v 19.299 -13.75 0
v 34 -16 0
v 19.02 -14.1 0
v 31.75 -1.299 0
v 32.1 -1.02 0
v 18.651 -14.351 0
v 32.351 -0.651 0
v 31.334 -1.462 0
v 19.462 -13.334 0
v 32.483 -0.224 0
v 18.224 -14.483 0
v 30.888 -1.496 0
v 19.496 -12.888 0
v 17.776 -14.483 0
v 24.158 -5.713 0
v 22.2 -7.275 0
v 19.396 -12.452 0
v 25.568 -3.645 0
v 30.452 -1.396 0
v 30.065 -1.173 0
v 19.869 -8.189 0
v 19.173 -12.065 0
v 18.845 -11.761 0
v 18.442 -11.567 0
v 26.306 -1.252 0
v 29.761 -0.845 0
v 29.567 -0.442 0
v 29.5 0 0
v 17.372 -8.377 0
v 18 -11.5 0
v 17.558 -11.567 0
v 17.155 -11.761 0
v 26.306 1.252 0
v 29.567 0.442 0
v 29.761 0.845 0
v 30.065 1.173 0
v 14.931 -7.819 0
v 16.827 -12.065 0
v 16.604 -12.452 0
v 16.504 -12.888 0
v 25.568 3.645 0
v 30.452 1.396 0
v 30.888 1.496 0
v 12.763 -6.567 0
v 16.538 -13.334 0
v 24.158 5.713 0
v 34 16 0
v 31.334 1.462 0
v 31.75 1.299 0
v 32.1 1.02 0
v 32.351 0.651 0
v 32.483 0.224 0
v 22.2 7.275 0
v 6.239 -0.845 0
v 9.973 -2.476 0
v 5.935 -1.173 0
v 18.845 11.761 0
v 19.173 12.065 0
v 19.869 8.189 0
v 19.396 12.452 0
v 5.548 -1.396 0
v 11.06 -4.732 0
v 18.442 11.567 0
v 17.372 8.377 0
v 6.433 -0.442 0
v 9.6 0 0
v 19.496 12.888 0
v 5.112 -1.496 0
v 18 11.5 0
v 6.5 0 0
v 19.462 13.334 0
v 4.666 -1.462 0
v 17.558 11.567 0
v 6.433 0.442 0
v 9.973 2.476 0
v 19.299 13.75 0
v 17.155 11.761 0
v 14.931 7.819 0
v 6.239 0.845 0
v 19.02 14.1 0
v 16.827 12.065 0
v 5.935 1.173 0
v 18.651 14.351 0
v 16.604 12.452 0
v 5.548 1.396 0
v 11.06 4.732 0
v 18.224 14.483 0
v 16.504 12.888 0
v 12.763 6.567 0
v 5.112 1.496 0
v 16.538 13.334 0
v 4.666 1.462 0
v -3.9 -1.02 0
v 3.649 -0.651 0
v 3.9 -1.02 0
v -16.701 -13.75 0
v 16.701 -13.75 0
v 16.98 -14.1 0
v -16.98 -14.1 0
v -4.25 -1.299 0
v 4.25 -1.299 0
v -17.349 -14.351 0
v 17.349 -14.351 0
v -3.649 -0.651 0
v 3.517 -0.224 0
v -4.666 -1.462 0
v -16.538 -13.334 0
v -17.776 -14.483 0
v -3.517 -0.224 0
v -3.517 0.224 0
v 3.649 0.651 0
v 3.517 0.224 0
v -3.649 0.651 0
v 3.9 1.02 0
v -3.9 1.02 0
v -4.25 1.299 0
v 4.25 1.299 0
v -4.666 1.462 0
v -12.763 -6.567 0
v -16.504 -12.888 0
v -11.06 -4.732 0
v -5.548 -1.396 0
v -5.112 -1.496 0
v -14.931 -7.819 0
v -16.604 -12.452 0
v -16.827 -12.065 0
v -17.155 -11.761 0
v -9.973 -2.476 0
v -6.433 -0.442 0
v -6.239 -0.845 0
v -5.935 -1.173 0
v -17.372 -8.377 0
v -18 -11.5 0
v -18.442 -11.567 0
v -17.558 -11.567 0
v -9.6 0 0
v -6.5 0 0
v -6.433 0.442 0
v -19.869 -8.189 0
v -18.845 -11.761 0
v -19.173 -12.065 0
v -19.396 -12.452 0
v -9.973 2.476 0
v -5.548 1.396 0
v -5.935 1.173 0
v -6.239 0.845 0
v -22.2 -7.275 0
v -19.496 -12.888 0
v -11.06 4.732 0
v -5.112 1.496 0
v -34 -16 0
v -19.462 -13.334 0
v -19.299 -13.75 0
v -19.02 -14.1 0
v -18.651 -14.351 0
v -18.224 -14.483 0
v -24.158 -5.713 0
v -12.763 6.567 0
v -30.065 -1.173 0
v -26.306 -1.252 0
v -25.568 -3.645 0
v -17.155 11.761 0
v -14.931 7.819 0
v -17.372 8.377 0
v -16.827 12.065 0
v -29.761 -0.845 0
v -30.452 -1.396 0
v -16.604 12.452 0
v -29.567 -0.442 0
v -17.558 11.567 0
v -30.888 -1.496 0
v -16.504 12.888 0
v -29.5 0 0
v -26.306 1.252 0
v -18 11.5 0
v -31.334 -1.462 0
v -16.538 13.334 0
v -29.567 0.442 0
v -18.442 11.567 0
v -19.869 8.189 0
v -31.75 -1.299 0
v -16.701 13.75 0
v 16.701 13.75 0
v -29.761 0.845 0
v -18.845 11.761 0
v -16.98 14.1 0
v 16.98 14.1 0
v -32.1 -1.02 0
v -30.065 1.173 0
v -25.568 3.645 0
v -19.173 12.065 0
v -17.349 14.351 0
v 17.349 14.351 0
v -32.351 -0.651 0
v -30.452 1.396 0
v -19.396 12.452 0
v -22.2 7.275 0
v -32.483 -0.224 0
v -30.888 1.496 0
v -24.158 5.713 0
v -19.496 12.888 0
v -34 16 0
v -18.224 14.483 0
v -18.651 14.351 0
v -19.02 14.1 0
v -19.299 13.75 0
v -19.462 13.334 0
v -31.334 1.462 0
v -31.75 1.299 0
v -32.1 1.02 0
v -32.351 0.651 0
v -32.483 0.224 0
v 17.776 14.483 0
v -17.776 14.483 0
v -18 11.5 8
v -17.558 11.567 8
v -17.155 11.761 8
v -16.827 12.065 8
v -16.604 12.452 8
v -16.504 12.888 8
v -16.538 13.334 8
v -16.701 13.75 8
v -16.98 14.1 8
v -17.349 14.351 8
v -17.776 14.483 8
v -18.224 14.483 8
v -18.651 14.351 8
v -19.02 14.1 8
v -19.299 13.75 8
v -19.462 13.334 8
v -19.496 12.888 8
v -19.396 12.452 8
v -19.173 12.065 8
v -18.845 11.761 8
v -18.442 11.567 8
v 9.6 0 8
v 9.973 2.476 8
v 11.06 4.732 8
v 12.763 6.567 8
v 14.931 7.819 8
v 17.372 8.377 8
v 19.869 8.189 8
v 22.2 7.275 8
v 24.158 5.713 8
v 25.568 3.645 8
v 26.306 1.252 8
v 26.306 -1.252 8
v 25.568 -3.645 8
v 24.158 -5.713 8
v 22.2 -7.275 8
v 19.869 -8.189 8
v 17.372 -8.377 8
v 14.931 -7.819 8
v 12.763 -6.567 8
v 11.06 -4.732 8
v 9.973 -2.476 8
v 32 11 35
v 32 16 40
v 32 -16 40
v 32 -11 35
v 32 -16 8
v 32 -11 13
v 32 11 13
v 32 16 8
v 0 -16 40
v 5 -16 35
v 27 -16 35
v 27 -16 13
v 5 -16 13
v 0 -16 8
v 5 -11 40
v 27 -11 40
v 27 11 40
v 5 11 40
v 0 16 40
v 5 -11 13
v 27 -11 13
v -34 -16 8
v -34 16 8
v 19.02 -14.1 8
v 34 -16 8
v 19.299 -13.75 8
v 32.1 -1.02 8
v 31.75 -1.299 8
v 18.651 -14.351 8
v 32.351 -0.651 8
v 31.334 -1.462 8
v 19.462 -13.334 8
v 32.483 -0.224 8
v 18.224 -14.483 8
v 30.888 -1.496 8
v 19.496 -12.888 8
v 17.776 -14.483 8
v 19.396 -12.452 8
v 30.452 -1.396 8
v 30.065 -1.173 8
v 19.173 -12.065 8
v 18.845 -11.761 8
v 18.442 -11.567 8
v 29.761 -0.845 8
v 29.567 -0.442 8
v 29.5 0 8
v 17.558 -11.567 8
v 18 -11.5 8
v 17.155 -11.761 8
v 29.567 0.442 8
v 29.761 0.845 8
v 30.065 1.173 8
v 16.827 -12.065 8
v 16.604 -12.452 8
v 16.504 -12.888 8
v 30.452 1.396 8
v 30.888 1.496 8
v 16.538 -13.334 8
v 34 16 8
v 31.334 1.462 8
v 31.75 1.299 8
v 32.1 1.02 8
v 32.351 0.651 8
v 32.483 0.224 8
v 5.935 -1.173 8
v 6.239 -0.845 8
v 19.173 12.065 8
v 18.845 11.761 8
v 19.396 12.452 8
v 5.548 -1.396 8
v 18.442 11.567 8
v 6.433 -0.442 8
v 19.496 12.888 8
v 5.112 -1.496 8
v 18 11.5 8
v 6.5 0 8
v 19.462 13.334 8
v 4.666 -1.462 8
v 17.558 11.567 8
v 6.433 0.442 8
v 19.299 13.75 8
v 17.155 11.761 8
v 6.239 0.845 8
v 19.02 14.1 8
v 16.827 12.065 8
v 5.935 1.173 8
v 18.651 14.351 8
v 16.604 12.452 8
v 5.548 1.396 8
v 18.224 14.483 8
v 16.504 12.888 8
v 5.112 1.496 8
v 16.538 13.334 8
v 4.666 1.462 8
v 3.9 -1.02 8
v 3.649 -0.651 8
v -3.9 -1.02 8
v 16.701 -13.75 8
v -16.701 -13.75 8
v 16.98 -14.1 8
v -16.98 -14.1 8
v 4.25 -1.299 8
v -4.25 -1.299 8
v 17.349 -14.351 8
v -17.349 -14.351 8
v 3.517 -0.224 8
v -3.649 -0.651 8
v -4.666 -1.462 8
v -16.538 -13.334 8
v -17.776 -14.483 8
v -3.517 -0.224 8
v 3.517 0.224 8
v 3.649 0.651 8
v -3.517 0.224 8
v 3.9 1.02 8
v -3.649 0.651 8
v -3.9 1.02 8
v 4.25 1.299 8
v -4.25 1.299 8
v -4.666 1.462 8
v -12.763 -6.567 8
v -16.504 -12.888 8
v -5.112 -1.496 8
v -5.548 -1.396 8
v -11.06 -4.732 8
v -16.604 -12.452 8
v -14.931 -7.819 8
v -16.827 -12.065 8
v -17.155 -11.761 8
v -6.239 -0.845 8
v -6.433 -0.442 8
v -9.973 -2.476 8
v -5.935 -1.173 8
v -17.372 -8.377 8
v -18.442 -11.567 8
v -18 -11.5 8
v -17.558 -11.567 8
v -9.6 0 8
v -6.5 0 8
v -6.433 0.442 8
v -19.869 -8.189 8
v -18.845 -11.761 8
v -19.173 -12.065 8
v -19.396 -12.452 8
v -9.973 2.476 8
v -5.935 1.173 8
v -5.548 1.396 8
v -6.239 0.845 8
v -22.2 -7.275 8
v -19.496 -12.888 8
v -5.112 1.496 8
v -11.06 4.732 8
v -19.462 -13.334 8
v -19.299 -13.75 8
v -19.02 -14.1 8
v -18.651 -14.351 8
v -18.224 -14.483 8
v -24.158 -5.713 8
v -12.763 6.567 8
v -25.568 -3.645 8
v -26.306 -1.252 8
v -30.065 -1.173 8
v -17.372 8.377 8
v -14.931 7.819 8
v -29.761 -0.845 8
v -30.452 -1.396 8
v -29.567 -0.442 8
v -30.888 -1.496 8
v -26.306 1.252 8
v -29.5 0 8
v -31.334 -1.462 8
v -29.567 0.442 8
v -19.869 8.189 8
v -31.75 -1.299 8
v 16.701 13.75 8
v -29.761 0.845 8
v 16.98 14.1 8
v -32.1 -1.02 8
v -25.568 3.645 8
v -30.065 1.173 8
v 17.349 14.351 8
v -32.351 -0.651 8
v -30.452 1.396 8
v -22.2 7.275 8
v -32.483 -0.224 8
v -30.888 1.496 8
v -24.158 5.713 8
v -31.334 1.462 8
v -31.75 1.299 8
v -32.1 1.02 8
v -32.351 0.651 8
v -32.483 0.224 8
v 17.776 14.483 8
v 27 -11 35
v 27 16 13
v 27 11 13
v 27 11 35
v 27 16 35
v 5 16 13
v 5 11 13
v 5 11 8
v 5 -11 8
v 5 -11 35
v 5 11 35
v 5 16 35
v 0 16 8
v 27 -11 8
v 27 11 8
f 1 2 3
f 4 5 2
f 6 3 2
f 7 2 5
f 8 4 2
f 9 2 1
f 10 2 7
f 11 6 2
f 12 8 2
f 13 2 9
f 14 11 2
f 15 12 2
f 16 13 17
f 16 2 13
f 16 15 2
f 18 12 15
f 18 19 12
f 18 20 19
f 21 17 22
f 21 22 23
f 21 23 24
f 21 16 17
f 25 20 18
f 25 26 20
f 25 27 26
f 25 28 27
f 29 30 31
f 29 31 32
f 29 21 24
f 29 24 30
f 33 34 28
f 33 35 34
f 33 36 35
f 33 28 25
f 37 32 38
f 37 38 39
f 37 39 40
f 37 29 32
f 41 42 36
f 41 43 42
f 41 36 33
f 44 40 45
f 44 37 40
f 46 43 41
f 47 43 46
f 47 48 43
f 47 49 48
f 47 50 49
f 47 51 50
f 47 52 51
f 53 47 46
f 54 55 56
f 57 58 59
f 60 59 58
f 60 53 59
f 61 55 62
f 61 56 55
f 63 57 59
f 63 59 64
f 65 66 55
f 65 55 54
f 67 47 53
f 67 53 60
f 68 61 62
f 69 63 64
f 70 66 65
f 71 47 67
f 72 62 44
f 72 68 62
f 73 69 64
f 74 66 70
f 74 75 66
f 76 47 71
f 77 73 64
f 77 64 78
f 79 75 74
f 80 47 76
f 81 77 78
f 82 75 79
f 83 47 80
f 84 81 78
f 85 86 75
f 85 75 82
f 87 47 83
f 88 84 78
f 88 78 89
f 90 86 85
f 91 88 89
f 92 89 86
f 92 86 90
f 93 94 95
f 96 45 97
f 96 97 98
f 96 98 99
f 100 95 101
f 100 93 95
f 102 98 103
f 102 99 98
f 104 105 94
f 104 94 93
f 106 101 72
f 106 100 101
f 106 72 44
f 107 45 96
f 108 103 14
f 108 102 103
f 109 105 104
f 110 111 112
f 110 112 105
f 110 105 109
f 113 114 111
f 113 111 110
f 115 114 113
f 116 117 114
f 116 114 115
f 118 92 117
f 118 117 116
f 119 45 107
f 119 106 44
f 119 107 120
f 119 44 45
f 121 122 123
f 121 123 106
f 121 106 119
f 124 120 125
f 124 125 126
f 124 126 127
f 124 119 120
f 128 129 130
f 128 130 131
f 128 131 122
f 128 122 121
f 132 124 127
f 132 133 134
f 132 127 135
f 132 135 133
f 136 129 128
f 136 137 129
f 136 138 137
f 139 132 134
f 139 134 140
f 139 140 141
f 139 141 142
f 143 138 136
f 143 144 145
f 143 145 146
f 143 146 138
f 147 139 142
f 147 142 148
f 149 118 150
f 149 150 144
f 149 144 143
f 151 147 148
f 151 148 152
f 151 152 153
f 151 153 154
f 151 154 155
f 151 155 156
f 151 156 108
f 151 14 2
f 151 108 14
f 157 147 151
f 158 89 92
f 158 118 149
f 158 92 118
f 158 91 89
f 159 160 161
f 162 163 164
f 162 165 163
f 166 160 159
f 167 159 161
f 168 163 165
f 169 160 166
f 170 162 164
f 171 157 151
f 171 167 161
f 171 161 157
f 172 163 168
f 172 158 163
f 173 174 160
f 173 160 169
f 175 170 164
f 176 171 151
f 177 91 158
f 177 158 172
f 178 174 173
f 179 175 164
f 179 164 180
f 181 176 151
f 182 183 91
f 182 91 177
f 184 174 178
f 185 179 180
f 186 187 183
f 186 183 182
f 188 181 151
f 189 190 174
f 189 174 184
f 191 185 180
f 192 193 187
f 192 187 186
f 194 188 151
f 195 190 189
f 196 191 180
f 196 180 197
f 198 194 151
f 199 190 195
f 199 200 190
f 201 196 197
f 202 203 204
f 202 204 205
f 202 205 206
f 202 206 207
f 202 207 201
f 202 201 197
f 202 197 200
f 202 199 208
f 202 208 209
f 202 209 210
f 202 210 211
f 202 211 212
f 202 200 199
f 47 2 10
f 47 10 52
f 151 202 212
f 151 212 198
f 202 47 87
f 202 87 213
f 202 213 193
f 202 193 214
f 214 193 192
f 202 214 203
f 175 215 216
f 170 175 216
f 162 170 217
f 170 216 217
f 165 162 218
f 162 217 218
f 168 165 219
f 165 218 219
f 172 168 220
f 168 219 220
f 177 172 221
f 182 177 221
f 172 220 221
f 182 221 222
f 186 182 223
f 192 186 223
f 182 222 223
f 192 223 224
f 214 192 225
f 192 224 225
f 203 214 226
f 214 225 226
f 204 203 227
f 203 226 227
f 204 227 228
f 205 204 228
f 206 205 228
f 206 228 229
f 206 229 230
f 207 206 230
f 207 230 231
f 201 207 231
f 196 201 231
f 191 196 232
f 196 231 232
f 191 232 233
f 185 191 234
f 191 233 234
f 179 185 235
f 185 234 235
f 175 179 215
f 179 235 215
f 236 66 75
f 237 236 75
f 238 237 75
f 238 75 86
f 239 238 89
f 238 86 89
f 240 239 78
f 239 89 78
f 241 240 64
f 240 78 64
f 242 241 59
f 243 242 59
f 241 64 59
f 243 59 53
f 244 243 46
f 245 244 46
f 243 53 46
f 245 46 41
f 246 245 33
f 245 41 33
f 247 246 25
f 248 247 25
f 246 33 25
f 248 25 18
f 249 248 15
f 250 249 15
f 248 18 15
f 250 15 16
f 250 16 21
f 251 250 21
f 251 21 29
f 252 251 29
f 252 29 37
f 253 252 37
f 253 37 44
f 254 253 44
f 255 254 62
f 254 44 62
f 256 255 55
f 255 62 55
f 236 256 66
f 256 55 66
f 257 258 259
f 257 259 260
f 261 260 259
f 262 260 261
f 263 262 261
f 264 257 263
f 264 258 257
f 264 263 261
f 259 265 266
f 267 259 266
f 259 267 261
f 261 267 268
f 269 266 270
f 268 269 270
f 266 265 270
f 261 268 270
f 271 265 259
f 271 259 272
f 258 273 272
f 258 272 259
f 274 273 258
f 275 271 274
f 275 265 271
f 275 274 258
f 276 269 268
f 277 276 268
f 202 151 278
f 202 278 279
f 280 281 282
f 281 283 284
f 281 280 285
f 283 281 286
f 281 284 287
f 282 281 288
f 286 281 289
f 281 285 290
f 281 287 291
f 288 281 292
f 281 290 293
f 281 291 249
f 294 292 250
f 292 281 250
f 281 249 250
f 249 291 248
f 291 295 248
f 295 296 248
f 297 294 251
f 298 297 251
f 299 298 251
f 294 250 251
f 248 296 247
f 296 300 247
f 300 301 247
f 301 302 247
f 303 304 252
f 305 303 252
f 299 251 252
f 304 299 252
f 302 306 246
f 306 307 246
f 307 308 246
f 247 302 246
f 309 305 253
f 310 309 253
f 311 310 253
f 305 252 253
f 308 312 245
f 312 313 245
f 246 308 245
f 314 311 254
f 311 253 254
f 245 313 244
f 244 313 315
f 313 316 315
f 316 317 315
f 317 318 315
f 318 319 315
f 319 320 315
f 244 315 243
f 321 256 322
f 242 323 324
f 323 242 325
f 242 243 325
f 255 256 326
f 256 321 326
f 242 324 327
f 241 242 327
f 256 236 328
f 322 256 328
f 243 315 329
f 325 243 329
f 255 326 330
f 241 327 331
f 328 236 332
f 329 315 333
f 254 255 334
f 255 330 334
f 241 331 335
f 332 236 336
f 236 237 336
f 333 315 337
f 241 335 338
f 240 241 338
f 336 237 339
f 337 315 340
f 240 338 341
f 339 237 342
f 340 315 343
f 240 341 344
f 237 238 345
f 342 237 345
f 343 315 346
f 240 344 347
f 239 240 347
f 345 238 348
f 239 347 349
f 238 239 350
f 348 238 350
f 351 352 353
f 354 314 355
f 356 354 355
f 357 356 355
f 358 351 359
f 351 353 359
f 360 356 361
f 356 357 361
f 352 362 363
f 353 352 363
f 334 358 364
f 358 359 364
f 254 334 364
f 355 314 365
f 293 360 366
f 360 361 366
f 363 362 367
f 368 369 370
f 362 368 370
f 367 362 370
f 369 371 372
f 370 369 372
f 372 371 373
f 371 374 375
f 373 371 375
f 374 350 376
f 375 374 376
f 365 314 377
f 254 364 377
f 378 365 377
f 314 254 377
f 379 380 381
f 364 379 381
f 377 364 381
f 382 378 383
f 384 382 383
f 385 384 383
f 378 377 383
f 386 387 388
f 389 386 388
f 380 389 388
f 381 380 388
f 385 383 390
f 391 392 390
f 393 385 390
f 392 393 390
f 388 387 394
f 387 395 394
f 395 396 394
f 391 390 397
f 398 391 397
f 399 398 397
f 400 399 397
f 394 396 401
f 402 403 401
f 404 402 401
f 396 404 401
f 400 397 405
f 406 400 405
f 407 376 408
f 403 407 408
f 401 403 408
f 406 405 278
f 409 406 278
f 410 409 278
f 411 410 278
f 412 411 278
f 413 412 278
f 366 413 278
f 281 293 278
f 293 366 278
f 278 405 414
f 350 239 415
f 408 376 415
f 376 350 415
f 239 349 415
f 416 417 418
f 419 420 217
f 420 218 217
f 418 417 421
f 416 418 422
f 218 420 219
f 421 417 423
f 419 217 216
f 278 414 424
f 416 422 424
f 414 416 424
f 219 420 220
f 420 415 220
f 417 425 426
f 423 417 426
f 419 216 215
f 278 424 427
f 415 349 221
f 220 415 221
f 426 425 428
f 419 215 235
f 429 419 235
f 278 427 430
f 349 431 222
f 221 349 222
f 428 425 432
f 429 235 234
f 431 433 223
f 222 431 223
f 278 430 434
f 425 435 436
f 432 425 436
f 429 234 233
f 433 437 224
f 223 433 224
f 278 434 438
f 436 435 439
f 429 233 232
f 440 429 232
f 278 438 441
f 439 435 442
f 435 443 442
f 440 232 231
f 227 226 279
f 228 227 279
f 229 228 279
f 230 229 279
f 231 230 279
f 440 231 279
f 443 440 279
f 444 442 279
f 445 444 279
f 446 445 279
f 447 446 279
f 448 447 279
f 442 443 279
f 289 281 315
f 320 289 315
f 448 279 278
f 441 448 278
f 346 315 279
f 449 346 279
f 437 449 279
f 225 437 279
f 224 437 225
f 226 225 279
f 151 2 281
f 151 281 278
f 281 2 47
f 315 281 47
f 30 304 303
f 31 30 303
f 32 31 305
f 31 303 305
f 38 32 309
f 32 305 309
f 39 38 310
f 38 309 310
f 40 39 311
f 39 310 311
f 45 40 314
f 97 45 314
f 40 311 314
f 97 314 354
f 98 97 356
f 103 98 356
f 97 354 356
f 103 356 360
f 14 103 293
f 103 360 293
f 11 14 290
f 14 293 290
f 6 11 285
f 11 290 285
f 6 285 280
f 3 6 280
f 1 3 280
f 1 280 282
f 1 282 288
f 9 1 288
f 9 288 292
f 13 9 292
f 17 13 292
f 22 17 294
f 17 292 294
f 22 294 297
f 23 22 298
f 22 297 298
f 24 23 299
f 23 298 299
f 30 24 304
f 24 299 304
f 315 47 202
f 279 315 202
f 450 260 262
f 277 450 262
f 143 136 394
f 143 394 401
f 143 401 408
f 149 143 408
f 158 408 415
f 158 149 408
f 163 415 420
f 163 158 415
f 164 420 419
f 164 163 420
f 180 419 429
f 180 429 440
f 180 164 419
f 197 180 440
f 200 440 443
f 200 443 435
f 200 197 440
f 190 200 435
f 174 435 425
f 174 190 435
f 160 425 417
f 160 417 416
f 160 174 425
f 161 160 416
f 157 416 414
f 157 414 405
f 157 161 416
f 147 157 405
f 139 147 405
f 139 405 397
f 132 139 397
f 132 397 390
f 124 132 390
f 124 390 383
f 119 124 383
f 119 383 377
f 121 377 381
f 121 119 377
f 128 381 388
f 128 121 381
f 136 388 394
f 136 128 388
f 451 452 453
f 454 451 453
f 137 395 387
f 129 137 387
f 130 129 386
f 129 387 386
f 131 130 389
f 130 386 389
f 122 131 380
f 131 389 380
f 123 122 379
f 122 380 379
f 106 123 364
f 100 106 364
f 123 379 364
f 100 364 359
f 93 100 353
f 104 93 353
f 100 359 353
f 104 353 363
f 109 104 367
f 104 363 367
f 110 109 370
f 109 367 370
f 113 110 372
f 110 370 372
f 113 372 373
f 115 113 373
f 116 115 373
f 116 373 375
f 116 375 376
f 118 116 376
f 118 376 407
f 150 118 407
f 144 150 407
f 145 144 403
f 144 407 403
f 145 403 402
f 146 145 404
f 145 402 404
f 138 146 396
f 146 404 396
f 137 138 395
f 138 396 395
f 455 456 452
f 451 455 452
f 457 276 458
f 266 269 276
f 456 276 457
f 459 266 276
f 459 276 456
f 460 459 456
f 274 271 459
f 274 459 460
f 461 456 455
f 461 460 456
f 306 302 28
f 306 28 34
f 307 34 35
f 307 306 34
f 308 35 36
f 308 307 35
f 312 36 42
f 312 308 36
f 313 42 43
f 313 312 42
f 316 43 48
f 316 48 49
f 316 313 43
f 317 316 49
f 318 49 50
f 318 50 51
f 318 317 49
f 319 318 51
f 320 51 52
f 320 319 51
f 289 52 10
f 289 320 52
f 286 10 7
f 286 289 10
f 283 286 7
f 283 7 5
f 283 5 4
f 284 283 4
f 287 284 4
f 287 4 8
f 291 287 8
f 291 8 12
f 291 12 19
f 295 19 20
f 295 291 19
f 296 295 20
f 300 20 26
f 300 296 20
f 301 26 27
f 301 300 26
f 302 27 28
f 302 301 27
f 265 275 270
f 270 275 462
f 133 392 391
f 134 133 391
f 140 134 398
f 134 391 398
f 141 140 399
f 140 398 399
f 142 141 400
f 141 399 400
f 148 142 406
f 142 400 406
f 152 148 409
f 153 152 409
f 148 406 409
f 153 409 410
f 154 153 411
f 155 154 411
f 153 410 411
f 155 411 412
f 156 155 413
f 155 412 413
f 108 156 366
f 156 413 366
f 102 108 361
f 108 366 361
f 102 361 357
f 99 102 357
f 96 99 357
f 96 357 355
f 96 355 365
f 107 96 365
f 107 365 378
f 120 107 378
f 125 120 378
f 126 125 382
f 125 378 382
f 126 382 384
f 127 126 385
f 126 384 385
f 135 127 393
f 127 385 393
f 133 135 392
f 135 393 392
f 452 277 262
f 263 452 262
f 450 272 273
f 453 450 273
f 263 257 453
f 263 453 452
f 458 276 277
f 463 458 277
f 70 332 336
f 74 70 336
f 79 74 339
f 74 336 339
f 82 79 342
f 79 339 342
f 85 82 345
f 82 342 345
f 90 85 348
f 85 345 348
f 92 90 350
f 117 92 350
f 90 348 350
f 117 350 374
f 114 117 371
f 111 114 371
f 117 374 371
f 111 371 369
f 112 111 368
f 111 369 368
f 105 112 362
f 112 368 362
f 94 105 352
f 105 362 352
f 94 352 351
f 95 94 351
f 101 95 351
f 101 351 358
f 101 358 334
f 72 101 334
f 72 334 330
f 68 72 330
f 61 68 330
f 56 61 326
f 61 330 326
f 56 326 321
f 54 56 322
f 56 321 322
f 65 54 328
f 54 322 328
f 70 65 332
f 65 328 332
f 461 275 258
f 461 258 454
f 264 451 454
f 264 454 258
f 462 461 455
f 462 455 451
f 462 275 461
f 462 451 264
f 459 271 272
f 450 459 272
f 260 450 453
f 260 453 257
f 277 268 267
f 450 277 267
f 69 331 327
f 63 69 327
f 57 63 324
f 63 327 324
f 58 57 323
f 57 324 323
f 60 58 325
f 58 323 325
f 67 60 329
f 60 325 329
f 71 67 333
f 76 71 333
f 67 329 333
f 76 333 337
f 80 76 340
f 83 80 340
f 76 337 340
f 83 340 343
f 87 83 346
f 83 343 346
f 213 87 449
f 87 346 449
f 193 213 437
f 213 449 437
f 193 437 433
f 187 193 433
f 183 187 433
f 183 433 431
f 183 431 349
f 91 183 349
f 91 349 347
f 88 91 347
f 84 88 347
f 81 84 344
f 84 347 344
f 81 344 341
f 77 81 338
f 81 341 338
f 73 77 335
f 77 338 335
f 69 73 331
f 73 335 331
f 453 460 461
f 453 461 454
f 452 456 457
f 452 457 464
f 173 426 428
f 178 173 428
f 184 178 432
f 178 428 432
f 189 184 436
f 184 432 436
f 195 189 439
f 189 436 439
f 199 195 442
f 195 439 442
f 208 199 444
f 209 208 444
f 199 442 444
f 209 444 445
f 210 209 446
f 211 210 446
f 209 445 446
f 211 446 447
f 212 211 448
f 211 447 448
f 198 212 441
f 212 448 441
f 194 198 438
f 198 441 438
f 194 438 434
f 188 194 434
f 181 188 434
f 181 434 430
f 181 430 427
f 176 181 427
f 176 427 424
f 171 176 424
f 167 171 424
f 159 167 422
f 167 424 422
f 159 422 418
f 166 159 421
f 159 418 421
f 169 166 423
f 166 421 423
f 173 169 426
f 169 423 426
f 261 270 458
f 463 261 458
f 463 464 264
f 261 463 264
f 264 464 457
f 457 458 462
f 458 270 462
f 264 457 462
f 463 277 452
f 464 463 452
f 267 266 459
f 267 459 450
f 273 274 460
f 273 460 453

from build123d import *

# Parameters (mm, degrees)
ESQUISSE2_W                  = 34
ESQUISSE2_H                  = 32
ESQUISSE2_R                  = 8.4
BOSS_EXTRU_1_DEPTH           = 8
ESQUISSE4_R                  = 1.5
ENL_V_MAT_EXTRU_1_DEPTH      = 8
R_P_TITION_CIRCULAIRE1_COUNT = 4
ESQUISSE10_W                 = 32
ESQUISSE10_H                 = 32
BOSS_EXTRU_4_DEPTH           = 32
SYM_TRIE1_COPY_1_SKETCH_R    = 1.5
SYM_TRIE1_COPY_1_DEPTH       = 8
SYM_TRIE1_COPY_2_SKETCH_R    = 1.5
SYM_TRIE1_COPY_2_DEPTH       = 8
SYM_TRIE1_COPY_3_SKETCH_R    = 1.5
SYM_TRIE1_COPY_3_DEPTH       = 8
ESQUISSE12_W                 = 22
ESQUISSE12_H                 = 22
ENL_V_MAT_EXTRU_4_DEPTH      = 18
ESQUISSE11_W                 = 22
ESQUISSE11_H                 = 22
ENL_V_MAT_EXTRU_5_DEPTH      = 62.481704596
ESQUISSE13_W                 = 22
ESQUISSE13_H                 = 22
ENL_V_MAT_EXTRU_6_DEPTH      = 32


with BuildPart() as part:
    # Esquisse2 → Boss.-Extru.1 (new body)
    with BuildSketch(Plane.XY):
        with Locations((-17, 0)):
            Rectangle(ESQUISSE2_W, ESQUISSE2_H)
        with Locations((-18, 0)):
            Circle(ESQUISSE2_R, mode=Mode.SUBTRACT)
    boss_extru_1 = extrude(amount=BOSS_EXTRU_1_DEPTH)

    # Esquisse4 → Enlèv. mat.-Extru.1 (cut)
    with BuildSketch(Plane.XY.offset(8)):
        with Locations((-31, 0)):
            Circle(ESQUISSE4_R)
    enl_v_mat_extru_1 = extrude(amount=-ENL_V_MAT_EXTRU_1_DEPTH, mode=Mode.SUBTRACT)

    # Répétition circulaire1: Enlèv. mat.-Extru.1 ×4 about axis
    r_p_tition_circulaire1_axis = Axis((-18, 0, 0), (0, 0, 1))
    for i in range(1, R_P_TITION_CIRCULAIRE1_COUNT):
        add(enl_v_mat_extru_1.rotate(r_p_tition_circulaire1_axis, i * 360 / R_P_TITION_CIRCULAIRE1_COUNT), mode=Mode.SUBTRACT)

    # Symétrie1: Boss.-Extru.1, Enlèv. mat.-Extru.1 across plane
    add(boss_extru_1.mirror(Plane(origin=(0, 0, 0), x_dir=(0, 0, 1), z_dir=(1, 0, 0))))
    add(enl_v_mat_extru_1.mirror(Plane(origin=(0, 0, 0), x_dir=(0, 0, 1), z_dir=(1, 0, 0))), mode=Mode.SUBTRACT)

    # Symétrie1 copy 1 sketch → Symétrie1 copy 1 (cut)
    with BuildSketch(Plane(origin=(18, 18, 8), x_dir=(0, 1, 0), z_dir=(0, 0, 1))):
        with Locations((-31, 0)):
            Circle(SYM_TRIE1_COPY_1_SKETCH_R)
    extrude(amount=-SYM_TRIE1_COPY_1_DEPTH, mode=Mode.SUBTRACT)

    # Symétrie1 copy 2 sketch → Symétrie1 copy 2 (cut)
    with BuildSketch(Plane(origin=(36, 0, 8), x_dir=(1, 0, 0), z_dir=(0, 0, 1))):
        with Locations((-31, 0)):
            Circle(SYM_TRIE1_COPY_2_SKETCH_R)
    extrude(amount=-SYM_TRIE1_COPY_2_DEPTH, mode=Mode.SUBTRACT)

    # Symétrie1 copy 3 sketch → Symétrie1 copy 3 (cut)
    with BuildSketch(Plane(origin=(18, -18, 8), x_dir=(0, -1, 0), z_dir=(0, 0, 1))):
        with Locations((-31, 0)):
            Circle(SYM_TRIE1_COPY_3_SKETCH_R)
    extrude(amount=-SYM_TRIE1_COPY_3_DEPTH, mode=Mode.SUBTRACT)


with BuildPart() as body_2:
    # Esquisse10 → Boss.-Extru.4 (new body)
    with BuildSketch(Plane(origin=(0, 0, 0), x_dir=(0, 0, -1), z_dir=(1, 0, 0))):
        with Locations((-24, 0)):
            Rectangle(ESQUISSE10_W, ESQUISSE10_H)
    extrude(amount=BOSS_EXTRU_4_DEPTH)

    # Esquisse12 → Enlèv. mat.-Extru.4 (cut)
    with BuildSketch(Plane(origin=(32, 0, 0), x_dir=(0, 0, -1), z_dir=(1, 0, 0))):
        with Locations((-24, 0)):
            Rectangle(ESQUISSE12_W, ESQUISSE12_H)
    extrude(amount=-ENL_V_MAT_EXTRU_4_DEPTH, mode=Mode.SUBTRACT)

    # Esquisse11 → Enlèv. mat.-Extru.5 (cut, through all)
    with BuildSketch(Plane.XZ.offset(16)):
        with Locations((16, 24)):
            Rectangle(ESQUISSE11_W, ESQUISSE11_H)
    extrude(amount=-ENL_V_MAT_EXTRU_5_DEPTH, mode=Mode.SUBTRACT)

    # Esquisse13 → Enlèv. mat.-Extru.6 (cut)
    with BuildSketch(Plane.XY.offset(40)):
        with Locations((16, 0)):
            Rectangle(ESQUISSE13_W, ESQUISSE13_H)
    extrude(amount=-ENL_V_MAT_EXTRU_6_DEPTH, mode=Mode.SUBTRACT)


solid = Compound([part.part, body_2.part])
